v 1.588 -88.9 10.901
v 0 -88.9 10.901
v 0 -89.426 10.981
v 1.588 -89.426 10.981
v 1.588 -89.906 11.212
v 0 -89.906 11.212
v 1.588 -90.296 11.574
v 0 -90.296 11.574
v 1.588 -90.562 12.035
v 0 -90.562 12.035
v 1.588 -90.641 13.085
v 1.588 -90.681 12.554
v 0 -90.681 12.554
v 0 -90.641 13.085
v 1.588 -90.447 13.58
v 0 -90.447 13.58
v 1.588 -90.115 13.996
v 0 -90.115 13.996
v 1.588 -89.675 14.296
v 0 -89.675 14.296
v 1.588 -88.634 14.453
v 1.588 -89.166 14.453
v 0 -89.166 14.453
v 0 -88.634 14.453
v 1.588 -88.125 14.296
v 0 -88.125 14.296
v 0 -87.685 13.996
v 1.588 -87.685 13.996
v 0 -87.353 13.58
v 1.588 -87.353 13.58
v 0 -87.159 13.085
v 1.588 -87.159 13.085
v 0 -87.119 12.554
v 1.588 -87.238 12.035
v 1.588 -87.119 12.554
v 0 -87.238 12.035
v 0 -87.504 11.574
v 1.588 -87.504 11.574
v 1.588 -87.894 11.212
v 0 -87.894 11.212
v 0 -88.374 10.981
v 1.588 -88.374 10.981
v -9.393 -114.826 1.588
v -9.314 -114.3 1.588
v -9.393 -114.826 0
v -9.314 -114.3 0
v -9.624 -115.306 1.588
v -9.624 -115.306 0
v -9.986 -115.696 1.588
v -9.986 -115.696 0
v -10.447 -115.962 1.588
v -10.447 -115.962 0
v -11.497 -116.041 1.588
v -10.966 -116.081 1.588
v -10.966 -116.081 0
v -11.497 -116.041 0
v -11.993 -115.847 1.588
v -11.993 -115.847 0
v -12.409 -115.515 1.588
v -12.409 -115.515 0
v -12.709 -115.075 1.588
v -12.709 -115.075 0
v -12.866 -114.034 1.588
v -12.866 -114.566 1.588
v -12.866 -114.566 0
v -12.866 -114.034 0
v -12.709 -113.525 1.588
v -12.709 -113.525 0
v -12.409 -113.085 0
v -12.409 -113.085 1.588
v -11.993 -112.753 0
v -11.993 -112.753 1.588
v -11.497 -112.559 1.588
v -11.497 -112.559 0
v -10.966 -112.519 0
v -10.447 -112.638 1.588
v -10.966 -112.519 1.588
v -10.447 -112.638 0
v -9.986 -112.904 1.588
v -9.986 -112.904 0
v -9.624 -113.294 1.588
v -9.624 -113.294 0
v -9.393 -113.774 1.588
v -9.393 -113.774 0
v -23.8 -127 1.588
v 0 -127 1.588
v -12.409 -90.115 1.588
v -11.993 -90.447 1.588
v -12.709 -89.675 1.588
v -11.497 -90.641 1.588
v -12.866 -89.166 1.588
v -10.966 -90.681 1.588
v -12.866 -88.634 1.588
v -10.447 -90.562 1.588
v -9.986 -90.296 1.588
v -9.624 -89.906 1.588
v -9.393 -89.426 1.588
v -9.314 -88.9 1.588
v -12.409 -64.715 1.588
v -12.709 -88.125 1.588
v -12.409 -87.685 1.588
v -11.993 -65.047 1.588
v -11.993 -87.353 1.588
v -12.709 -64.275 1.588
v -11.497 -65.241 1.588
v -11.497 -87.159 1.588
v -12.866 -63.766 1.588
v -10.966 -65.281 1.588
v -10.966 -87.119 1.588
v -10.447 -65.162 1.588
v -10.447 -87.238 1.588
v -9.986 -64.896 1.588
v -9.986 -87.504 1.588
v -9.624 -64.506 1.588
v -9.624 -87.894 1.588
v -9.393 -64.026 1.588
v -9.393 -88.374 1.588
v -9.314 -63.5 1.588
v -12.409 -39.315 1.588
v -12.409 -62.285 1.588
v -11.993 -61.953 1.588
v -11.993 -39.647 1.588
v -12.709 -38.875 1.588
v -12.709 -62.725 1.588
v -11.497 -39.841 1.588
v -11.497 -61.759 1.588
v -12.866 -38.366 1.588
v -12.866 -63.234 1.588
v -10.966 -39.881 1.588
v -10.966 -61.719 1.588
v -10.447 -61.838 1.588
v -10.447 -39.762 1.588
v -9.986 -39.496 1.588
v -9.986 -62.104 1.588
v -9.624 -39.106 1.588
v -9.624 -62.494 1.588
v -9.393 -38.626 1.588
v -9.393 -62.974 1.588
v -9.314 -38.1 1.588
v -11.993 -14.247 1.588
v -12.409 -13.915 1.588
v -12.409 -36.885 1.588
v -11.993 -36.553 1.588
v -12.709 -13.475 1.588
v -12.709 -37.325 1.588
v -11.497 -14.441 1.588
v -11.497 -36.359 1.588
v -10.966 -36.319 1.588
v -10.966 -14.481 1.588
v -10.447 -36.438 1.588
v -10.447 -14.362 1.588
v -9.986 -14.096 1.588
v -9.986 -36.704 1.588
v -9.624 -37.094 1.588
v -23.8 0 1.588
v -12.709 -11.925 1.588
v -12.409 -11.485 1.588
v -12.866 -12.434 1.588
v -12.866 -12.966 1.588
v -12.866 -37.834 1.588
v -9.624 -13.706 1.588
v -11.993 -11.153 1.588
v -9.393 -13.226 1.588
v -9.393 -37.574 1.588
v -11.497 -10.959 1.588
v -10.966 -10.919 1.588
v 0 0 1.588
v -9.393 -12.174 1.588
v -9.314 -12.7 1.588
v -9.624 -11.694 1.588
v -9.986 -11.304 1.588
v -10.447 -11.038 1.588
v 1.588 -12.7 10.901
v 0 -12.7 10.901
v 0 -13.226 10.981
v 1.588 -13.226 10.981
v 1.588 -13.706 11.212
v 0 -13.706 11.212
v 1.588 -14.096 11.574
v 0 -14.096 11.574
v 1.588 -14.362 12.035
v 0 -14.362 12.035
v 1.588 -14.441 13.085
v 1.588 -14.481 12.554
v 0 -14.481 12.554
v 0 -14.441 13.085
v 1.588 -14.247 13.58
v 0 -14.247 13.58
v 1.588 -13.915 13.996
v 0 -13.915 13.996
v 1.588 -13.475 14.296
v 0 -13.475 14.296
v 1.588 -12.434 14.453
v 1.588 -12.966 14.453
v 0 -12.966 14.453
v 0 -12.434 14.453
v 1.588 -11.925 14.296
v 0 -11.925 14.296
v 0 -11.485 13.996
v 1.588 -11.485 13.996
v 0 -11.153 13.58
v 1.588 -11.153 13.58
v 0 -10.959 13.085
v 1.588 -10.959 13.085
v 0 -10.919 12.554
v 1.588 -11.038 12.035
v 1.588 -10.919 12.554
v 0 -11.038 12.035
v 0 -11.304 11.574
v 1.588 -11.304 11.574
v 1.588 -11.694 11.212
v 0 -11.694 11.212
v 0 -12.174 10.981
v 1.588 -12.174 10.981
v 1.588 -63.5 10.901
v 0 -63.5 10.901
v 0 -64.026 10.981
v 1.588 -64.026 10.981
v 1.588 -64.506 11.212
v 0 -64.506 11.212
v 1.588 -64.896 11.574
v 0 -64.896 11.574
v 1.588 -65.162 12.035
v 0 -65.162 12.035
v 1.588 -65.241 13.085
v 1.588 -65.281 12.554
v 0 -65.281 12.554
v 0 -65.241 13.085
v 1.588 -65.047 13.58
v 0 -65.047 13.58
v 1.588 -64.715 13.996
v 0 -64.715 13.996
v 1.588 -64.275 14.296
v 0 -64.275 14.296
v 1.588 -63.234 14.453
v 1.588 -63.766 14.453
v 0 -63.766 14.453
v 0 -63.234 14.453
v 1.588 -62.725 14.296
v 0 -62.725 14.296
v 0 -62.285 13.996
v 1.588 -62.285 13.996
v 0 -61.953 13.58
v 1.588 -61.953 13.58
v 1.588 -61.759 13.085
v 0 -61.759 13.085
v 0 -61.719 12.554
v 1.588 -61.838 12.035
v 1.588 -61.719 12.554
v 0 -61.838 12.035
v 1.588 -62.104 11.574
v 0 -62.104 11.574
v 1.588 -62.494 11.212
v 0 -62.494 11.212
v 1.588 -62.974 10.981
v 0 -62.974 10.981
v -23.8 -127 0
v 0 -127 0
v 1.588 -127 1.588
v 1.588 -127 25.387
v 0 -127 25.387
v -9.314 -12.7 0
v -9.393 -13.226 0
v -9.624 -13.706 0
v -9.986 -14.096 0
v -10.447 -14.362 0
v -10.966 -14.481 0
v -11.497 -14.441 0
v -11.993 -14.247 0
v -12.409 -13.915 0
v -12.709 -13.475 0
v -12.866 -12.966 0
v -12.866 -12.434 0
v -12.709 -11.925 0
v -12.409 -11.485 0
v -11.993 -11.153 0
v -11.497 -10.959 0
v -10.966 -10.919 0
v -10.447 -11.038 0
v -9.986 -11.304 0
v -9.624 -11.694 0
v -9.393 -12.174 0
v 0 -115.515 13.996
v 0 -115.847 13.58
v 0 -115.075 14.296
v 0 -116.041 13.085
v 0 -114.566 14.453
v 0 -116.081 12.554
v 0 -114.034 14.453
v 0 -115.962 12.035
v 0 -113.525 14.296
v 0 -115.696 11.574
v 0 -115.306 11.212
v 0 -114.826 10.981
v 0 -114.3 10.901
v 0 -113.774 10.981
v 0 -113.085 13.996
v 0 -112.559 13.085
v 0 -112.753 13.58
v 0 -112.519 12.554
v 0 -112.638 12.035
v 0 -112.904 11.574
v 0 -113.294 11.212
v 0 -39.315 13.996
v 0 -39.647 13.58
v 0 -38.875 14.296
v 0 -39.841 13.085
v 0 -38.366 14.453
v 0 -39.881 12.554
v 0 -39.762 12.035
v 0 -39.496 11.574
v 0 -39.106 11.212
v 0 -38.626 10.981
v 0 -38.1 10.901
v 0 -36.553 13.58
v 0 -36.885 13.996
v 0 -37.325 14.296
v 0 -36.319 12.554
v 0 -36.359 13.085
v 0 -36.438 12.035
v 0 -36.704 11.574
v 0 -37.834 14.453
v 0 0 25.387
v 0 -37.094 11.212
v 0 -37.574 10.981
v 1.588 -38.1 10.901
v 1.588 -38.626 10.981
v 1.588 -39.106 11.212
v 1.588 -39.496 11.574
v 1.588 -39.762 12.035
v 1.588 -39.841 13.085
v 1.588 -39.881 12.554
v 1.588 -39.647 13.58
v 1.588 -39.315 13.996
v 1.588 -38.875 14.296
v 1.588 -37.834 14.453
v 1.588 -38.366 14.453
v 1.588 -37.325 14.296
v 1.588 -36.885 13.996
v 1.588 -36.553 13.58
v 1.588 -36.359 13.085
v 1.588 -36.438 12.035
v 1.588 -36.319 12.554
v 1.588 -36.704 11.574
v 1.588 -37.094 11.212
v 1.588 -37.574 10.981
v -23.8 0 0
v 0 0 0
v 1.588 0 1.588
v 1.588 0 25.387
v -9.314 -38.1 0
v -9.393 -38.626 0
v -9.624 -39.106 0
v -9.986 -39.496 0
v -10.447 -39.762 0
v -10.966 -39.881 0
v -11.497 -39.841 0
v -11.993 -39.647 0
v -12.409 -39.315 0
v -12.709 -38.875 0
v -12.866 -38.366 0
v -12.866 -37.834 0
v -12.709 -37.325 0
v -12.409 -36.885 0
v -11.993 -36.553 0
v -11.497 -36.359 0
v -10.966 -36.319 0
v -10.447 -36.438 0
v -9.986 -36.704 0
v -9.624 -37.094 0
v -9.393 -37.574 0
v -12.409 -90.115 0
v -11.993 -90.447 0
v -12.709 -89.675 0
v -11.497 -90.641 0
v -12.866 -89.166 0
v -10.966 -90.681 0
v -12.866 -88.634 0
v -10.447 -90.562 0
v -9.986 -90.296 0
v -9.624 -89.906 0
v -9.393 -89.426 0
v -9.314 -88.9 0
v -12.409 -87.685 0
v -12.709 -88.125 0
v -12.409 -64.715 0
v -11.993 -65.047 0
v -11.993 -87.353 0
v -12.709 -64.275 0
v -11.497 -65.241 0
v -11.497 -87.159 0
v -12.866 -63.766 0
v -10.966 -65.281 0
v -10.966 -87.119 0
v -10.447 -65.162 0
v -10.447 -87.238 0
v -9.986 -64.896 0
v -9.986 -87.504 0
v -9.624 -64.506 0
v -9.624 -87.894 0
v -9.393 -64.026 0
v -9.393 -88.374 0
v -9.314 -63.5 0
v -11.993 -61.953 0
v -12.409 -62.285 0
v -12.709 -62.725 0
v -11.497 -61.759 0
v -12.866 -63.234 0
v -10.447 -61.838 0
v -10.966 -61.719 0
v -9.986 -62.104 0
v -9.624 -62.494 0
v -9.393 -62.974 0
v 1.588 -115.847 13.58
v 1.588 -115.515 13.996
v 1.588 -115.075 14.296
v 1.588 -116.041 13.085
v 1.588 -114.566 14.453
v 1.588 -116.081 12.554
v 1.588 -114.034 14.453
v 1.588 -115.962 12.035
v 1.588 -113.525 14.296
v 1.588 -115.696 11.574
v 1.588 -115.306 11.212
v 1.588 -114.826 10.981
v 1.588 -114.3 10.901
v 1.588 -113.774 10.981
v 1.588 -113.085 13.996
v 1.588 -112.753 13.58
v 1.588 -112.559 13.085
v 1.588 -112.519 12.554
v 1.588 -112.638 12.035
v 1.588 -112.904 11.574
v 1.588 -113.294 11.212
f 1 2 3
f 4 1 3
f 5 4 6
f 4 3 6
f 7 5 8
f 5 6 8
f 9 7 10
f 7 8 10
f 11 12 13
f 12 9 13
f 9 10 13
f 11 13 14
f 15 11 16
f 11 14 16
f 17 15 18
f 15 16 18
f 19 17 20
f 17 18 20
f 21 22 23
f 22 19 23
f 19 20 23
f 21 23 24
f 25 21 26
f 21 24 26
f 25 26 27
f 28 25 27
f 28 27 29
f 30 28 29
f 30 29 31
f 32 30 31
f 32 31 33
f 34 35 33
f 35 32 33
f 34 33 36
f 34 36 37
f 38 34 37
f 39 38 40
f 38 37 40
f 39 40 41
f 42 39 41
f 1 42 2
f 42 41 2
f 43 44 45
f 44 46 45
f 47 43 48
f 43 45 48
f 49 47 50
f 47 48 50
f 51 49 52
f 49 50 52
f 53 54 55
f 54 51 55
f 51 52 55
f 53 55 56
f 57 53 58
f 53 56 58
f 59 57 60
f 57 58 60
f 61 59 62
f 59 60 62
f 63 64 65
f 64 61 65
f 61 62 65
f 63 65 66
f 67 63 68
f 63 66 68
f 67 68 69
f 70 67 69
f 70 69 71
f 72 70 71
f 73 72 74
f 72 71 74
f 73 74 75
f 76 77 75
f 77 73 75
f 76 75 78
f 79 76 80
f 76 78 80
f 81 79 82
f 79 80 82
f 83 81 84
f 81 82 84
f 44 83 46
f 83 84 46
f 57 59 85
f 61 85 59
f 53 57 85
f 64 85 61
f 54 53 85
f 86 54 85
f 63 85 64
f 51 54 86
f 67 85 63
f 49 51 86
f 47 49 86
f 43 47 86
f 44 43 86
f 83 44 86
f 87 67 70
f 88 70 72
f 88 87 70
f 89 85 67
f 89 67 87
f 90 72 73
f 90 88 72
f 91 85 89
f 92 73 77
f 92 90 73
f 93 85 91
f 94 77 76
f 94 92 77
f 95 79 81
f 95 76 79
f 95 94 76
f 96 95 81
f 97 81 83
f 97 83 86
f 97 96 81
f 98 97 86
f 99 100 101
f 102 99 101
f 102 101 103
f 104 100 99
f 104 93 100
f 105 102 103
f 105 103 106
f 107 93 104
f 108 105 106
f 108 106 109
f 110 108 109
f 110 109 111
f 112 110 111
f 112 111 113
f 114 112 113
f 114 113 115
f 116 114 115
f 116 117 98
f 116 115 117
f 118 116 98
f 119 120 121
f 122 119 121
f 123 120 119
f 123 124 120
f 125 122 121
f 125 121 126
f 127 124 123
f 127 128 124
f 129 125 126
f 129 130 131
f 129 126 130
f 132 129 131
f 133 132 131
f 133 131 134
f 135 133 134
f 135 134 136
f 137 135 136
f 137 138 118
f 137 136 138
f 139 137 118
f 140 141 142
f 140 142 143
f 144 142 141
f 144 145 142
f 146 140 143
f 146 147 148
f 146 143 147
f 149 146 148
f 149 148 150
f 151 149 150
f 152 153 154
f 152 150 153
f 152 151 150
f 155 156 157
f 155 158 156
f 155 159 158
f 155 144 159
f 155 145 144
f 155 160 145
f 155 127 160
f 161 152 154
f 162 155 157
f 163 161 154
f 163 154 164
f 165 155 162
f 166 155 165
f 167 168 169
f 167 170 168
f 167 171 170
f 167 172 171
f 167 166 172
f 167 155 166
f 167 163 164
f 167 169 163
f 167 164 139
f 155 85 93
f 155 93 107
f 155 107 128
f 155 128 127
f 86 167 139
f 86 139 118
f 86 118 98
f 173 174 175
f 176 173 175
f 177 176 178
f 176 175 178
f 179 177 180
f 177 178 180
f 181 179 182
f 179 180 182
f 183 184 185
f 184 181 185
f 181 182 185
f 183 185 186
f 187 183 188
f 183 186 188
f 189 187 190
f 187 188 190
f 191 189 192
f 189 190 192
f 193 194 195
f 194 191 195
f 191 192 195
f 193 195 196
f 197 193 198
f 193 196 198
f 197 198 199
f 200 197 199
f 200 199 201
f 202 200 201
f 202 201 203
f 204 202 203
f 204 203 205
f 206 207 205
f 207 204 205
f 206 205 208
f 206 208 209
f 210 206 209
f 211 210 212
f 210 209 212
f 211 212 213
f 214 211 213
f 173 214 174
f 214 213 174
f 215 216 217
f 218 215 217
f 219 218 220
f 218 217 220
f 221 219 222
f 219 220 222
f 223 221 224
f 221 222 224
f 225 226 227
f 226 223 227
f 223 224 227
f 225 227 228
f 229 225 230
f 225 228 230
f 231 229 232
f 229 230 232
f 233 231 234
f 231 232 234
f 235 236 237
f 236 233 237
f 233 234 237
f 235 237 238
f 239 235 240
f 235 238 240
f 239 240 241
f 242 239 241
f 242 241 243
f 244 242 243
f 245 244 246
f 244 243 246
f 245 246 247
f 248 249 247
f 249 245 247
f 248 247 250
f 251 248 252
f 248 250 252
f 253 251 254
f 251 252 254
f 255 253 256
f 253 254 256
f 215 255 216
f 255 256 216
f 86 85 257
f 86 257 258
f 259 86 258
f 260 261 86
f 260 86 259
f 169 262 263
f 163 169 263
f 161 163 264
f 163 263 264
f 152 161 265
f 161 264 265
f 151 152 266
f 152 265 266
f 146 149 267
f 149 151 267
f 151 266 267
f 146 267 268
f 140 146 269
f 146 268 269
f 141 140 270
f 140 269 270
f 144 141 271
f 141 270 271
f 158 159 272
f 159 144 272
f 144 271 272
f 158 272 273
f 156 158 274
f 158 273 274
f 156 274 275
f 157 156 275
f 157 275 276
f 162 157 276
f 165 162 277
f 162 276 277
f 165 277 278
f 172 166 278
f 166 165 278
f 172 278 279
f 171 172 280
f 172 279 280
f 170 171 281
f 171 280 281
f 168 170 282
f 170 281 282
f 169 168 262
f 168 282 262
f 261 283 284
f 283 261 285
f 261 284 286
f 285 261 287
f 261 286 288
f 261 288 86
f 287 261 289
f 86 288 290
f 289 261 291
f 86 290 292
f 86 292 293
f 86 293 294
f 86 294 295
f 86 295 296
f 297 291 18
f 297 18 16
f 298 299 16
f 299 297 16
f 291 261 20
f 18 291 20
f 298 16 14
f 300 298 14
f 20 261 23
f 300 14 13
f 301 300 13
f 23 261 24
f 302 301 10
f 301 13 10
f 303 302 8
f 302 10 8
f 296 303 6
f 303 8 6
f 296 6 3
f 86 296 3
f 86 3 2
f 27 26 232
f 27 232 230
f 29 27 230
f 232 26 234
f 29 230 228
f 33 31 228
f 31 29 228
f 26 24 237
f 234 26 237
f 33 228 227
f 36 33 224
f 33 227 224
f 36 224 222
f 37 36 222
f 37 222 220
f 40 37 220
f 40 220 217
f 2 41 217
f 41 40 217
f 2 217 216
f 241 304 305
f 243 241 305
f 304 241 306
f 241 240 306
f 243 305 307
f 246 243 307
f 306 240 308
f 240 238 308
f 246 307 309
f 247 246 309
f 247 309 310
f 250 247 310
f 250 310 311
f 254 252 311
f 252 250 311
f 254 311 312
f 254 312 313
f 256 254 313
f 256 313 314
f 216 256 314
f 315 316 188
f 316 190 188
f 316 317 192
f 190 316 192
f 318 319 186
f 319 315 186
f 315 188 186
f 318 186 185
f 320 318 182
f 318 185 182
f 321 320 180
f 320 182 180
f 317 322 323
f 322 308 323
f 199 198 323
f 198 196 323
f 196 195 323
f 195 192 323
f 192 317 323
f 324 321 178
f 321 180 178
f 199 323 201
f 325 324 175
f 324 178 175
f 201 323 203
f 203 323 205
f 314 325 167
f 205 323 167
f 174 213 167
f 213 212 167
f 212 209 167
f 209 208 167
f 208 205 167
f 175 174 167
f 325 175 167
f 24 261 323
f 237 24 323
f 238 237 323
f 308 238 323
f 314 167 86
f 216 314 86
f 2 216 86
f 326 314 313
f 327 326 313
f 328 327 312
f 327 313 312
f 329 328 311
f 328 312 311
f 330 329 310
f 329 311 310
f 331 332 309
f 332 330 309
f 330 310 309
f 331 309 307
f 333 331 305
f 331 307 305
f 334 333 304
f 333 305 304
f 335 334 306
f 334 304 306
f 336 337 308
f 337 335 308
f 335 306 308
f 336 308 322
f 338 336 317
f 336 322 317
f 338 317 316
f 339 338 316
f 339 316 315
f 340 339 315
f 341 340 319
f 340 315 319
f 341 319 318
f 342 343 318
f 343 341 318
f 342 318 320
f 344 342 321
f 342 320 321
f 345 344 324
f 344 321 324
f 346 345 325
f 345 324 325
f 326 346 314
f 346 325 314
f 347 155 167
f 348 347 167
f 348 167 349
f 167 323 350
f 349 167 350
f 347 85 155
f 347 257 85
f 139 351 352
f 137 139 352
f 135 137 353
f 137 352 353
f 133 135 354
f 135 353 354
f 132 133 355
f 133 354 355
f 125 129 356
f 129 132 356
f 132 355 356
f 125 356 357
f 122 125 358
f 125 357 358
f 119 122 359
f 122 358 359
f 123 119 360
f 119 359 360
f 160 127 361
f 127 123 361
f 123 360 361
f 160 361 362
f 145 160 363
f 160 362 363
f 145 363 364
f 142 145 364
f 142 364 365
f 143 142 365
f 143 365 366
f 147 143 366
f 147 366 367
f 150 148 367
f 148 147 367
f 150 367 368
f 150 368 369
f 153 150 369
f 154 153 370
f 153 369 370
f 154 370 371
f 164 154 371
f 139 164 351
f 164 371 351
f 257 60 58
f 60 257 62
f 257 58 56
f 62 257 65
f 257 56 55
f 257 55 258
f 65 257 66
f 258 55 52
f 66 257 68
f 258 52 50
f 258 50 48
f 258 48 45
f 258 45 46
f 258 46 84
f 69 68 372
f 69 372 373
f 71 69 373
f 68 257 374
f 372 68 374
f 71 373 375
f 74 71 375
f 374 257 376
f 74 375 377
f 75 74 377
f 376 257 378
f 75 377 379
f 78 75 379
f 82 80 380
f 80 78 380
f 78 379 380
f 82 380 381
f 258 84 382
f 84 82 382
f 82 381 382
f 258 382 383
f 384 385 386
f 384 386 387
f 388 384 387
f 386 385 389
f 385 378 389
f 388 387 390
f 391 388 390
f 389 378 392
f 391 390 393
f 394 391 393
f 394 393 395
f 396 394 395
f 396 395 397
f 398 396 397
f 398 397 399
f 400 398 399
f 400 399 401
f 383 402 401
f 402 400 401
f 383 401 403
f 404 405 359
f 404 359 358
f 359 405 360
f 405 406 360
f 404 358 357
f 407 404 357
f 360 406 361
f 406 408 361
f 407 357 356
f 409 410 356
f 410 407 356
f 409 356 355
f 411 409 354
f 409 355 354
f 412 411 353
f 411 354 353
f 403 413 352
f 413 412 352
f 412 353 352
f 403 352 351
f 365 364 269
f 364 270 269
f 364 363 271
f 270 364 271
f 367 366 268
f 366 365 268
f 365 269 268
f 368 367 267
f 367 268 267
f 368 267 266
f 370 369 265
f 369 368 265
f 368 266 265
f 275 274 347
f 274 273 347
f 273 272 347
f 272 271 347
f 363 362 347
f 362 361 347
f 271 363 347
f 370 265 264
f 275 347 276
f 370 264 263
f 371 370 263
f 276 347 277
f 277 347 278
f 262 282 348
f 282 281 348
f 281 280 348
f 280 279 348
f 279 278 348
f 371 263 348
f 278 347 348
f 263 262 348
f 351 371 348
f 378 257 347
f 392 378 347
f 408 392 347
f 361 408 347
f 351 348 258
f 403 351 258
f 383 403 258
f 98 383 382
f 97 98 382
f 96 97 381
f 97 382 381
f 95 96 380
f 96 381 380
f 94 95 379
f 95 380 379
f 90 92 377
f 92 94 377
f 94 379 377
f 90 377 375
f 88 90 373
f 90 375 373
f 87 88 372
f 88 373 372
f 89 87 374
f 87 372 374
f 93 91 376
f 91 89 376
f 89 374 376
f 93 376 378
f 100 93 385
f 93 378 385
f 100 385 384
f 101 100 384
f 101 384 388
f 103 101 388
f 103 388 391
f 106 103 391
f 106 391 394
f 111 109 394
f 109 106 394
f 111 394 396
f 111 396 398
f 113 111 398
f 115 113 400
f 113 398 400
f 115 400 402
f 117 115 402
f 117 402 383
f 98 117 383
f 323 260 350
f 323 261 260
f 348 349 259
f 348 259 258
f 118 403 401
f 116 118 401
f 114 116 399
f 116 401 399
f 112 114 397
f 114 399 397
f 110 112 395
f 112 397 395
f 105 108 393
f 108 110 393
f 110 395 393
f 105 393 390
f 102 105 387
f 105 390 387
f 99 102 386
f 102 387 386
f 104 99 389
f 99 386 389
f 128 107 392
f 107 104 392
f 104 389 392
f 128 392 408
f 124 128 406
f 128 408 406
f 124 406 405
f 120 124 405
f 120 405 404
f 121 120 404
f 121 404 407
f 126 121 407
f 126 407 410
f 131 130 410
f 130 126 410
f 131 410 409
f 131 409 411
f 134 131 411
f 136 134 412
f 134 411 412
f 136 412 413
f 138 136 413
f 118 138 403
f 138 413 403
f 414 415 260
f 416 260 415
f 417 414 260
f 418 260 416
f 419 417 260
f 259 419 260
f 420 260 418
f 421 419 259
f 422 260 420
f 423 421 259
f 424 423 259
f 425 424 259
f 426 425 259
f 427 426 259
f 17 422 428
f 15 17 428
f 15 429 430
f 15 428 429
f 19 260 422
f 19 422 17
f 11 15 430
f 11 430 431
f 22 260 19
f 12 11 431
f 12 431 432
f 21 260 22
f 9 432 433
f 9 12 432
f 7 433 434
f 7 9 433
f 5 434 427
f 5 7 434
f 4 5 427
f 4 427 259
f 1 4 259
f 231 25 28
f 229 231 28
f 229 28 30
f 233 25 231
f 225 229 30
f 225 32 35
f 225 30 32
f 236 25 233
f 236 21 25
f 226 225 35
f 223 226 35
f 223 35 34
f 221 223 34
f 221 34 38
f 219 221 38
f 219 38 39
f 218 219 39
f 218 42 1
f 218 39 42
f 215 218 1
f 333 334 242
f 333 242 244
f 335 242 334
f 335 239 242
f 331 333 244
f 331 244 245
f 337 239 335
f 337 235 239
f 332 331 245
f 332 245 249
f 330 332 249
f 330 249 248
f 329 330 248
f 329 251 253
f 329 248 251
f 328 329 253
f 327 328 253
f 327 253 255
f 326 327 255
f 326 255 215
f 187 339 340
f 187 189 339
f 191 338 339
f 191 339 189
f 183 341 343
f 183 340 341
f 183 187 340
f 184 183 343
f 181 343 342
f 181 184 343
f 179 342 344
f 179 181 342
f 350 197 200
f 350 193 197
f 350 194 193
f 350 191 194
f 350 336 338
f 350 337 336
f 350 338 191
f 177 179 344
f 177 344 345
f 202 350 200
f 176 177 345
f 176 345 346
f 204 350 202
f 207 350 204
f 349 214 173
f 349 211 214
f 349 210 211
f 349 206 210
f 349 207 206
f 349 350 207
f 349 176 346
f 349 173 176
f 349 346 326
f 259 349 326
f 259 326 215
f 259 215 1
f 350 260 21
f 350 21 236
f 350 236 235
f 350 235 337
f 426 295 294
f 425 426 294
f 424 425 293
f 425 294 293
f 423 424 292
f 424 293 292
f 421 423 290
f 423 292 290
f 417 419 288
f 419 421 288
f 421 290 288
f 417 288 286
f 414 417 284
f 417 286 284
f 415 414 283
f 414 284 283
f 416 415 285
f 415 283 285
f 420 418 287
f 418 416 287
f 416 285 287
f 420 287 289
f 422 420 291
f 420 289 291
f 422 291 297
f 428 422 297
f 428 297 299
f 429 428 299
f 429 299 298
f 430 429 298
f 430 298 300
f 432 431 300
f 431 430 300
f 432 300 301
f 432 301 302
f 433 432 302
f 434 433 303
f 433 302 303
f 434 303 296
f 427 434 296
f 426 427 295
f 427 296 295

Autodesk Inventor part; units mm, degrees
ref_plane "YZ Plane" through (0, 0, 0) normal (1, 0, 0) x (0, 1, 0)
ref_plane "XZ Plane" through (0, 0, 0) normal (0, 1, 0) x (-1, 0, 0)
ref_plane "XY Plane" through (0, 0, 0) normal (0, 0, 1) x (1, 0, 0)
sketch "Sketch1" plane through (0, 0, 0) normal (0, 0, 1) x (1, 0, 0)
  line L0 (-23.7998, 0) -> (0, 0)
  line L1 (0, 0) -> (0, -127)
  line L2 (0, -127) -> (-23.7998, -127)
  line L3 (-23.7998, -127) -> (-23.7998, 0)
  circle A0 centre (-11.0998, -12.7) radius 1.7859
  circle A1 centre (-11.0998, -38.1) radius 1.7859
  circle A2 centre (-11.0998, -63.5) radius 1.7859
  circle A3 centre (-11.0998, -88.9) radius 1.7859
  circle A4 centre (-11.0998, -114.3) radius 1.7859
  line L4 (-11.0998, -12.7) -> (-11.0998, -38.1) construction
  line L5 (-11.0998, -38.1) -> (-11.0998, -63.5) construction
  line L6 (-11.0998, -63.5) -> (-11.0998, -88.9) construction
  line L7 (-11.0998, -88.9) -> (-11.0998, -114.3) construction
  dimension "d0" = 23.7998
  dimension "d1" = 127
  dimension "d2" = 3.5719
  dimension "d3" = 25.4
  dimension "d4" = 12.7
  dimension "d5" = 11.0998
extrude "Extrusion1" add sketch "Sketch1" along normal blind 1.5875
sketch "Sketch3" plane through (0, -127, 0) normal (1, 0, 0) x (0, 0, -1)
  line L0 (-25.3873, 127) -> (-1.5875, 127)
  line L1 (-1.5875, 127) -> (-1.5875, 0)
  line L2 (-1.5875, 0) -> (-25.3873, 0)
  line L3 (-25.3873, 0) -> (-25.3873, 127)
  circle A0 centre (-12.6873, 114.3) radius 1.7859
  circle A1 centre (-12.6873, 88.9) radius 1.7859
  circle A2 centre (-12.6873, 63.5) radius 1.7859
  circle A3 centre (-12.6873, 38.1) radius 1.7859
  circle A4 centre (-12.6873, 12.7) radius 1.7859
  line L4 (-12.6873, 114.3) -> (-12.6873, 88.9) construction
  line L5 (-12.6873, 88.9) -> (-12.6873, 63.5) construction
  line L6 (-12.6873, 63.5) -> (-12.6873, 38.1) construction
  line L7 (-12.6873, 38.1) -> (-12.6873, 12.7) construction
  dimension "d8" = 23.7998
  dimension "d9" = 127
  dimension "d10" = 3.5719
  dimension "d11" = 25.4
  dimension "d12" = 12.7
  dimension "d13" = 11.0998
extrude "Extrusion2" add sketch "Sketch3" along normal blind 1.5875
sketch "Sketch4" plane through (0, -127, 1.5875) normal (0, -1, 0) x (1, 0, 0)
  line L0 (0, 0) -> (1.5875, 0) projected
  line L1 (0, 23.7998) -> (1.5875, 23.7998) projected
  line L2 (1.5875, 0) -> (0, -1.5875)
  line L3 (0, -1.5875) -> (0, 0)
extrude "Extrusion3" add sketch "Sketch4" against normal blind 127
properties part number "Angle bracket"
